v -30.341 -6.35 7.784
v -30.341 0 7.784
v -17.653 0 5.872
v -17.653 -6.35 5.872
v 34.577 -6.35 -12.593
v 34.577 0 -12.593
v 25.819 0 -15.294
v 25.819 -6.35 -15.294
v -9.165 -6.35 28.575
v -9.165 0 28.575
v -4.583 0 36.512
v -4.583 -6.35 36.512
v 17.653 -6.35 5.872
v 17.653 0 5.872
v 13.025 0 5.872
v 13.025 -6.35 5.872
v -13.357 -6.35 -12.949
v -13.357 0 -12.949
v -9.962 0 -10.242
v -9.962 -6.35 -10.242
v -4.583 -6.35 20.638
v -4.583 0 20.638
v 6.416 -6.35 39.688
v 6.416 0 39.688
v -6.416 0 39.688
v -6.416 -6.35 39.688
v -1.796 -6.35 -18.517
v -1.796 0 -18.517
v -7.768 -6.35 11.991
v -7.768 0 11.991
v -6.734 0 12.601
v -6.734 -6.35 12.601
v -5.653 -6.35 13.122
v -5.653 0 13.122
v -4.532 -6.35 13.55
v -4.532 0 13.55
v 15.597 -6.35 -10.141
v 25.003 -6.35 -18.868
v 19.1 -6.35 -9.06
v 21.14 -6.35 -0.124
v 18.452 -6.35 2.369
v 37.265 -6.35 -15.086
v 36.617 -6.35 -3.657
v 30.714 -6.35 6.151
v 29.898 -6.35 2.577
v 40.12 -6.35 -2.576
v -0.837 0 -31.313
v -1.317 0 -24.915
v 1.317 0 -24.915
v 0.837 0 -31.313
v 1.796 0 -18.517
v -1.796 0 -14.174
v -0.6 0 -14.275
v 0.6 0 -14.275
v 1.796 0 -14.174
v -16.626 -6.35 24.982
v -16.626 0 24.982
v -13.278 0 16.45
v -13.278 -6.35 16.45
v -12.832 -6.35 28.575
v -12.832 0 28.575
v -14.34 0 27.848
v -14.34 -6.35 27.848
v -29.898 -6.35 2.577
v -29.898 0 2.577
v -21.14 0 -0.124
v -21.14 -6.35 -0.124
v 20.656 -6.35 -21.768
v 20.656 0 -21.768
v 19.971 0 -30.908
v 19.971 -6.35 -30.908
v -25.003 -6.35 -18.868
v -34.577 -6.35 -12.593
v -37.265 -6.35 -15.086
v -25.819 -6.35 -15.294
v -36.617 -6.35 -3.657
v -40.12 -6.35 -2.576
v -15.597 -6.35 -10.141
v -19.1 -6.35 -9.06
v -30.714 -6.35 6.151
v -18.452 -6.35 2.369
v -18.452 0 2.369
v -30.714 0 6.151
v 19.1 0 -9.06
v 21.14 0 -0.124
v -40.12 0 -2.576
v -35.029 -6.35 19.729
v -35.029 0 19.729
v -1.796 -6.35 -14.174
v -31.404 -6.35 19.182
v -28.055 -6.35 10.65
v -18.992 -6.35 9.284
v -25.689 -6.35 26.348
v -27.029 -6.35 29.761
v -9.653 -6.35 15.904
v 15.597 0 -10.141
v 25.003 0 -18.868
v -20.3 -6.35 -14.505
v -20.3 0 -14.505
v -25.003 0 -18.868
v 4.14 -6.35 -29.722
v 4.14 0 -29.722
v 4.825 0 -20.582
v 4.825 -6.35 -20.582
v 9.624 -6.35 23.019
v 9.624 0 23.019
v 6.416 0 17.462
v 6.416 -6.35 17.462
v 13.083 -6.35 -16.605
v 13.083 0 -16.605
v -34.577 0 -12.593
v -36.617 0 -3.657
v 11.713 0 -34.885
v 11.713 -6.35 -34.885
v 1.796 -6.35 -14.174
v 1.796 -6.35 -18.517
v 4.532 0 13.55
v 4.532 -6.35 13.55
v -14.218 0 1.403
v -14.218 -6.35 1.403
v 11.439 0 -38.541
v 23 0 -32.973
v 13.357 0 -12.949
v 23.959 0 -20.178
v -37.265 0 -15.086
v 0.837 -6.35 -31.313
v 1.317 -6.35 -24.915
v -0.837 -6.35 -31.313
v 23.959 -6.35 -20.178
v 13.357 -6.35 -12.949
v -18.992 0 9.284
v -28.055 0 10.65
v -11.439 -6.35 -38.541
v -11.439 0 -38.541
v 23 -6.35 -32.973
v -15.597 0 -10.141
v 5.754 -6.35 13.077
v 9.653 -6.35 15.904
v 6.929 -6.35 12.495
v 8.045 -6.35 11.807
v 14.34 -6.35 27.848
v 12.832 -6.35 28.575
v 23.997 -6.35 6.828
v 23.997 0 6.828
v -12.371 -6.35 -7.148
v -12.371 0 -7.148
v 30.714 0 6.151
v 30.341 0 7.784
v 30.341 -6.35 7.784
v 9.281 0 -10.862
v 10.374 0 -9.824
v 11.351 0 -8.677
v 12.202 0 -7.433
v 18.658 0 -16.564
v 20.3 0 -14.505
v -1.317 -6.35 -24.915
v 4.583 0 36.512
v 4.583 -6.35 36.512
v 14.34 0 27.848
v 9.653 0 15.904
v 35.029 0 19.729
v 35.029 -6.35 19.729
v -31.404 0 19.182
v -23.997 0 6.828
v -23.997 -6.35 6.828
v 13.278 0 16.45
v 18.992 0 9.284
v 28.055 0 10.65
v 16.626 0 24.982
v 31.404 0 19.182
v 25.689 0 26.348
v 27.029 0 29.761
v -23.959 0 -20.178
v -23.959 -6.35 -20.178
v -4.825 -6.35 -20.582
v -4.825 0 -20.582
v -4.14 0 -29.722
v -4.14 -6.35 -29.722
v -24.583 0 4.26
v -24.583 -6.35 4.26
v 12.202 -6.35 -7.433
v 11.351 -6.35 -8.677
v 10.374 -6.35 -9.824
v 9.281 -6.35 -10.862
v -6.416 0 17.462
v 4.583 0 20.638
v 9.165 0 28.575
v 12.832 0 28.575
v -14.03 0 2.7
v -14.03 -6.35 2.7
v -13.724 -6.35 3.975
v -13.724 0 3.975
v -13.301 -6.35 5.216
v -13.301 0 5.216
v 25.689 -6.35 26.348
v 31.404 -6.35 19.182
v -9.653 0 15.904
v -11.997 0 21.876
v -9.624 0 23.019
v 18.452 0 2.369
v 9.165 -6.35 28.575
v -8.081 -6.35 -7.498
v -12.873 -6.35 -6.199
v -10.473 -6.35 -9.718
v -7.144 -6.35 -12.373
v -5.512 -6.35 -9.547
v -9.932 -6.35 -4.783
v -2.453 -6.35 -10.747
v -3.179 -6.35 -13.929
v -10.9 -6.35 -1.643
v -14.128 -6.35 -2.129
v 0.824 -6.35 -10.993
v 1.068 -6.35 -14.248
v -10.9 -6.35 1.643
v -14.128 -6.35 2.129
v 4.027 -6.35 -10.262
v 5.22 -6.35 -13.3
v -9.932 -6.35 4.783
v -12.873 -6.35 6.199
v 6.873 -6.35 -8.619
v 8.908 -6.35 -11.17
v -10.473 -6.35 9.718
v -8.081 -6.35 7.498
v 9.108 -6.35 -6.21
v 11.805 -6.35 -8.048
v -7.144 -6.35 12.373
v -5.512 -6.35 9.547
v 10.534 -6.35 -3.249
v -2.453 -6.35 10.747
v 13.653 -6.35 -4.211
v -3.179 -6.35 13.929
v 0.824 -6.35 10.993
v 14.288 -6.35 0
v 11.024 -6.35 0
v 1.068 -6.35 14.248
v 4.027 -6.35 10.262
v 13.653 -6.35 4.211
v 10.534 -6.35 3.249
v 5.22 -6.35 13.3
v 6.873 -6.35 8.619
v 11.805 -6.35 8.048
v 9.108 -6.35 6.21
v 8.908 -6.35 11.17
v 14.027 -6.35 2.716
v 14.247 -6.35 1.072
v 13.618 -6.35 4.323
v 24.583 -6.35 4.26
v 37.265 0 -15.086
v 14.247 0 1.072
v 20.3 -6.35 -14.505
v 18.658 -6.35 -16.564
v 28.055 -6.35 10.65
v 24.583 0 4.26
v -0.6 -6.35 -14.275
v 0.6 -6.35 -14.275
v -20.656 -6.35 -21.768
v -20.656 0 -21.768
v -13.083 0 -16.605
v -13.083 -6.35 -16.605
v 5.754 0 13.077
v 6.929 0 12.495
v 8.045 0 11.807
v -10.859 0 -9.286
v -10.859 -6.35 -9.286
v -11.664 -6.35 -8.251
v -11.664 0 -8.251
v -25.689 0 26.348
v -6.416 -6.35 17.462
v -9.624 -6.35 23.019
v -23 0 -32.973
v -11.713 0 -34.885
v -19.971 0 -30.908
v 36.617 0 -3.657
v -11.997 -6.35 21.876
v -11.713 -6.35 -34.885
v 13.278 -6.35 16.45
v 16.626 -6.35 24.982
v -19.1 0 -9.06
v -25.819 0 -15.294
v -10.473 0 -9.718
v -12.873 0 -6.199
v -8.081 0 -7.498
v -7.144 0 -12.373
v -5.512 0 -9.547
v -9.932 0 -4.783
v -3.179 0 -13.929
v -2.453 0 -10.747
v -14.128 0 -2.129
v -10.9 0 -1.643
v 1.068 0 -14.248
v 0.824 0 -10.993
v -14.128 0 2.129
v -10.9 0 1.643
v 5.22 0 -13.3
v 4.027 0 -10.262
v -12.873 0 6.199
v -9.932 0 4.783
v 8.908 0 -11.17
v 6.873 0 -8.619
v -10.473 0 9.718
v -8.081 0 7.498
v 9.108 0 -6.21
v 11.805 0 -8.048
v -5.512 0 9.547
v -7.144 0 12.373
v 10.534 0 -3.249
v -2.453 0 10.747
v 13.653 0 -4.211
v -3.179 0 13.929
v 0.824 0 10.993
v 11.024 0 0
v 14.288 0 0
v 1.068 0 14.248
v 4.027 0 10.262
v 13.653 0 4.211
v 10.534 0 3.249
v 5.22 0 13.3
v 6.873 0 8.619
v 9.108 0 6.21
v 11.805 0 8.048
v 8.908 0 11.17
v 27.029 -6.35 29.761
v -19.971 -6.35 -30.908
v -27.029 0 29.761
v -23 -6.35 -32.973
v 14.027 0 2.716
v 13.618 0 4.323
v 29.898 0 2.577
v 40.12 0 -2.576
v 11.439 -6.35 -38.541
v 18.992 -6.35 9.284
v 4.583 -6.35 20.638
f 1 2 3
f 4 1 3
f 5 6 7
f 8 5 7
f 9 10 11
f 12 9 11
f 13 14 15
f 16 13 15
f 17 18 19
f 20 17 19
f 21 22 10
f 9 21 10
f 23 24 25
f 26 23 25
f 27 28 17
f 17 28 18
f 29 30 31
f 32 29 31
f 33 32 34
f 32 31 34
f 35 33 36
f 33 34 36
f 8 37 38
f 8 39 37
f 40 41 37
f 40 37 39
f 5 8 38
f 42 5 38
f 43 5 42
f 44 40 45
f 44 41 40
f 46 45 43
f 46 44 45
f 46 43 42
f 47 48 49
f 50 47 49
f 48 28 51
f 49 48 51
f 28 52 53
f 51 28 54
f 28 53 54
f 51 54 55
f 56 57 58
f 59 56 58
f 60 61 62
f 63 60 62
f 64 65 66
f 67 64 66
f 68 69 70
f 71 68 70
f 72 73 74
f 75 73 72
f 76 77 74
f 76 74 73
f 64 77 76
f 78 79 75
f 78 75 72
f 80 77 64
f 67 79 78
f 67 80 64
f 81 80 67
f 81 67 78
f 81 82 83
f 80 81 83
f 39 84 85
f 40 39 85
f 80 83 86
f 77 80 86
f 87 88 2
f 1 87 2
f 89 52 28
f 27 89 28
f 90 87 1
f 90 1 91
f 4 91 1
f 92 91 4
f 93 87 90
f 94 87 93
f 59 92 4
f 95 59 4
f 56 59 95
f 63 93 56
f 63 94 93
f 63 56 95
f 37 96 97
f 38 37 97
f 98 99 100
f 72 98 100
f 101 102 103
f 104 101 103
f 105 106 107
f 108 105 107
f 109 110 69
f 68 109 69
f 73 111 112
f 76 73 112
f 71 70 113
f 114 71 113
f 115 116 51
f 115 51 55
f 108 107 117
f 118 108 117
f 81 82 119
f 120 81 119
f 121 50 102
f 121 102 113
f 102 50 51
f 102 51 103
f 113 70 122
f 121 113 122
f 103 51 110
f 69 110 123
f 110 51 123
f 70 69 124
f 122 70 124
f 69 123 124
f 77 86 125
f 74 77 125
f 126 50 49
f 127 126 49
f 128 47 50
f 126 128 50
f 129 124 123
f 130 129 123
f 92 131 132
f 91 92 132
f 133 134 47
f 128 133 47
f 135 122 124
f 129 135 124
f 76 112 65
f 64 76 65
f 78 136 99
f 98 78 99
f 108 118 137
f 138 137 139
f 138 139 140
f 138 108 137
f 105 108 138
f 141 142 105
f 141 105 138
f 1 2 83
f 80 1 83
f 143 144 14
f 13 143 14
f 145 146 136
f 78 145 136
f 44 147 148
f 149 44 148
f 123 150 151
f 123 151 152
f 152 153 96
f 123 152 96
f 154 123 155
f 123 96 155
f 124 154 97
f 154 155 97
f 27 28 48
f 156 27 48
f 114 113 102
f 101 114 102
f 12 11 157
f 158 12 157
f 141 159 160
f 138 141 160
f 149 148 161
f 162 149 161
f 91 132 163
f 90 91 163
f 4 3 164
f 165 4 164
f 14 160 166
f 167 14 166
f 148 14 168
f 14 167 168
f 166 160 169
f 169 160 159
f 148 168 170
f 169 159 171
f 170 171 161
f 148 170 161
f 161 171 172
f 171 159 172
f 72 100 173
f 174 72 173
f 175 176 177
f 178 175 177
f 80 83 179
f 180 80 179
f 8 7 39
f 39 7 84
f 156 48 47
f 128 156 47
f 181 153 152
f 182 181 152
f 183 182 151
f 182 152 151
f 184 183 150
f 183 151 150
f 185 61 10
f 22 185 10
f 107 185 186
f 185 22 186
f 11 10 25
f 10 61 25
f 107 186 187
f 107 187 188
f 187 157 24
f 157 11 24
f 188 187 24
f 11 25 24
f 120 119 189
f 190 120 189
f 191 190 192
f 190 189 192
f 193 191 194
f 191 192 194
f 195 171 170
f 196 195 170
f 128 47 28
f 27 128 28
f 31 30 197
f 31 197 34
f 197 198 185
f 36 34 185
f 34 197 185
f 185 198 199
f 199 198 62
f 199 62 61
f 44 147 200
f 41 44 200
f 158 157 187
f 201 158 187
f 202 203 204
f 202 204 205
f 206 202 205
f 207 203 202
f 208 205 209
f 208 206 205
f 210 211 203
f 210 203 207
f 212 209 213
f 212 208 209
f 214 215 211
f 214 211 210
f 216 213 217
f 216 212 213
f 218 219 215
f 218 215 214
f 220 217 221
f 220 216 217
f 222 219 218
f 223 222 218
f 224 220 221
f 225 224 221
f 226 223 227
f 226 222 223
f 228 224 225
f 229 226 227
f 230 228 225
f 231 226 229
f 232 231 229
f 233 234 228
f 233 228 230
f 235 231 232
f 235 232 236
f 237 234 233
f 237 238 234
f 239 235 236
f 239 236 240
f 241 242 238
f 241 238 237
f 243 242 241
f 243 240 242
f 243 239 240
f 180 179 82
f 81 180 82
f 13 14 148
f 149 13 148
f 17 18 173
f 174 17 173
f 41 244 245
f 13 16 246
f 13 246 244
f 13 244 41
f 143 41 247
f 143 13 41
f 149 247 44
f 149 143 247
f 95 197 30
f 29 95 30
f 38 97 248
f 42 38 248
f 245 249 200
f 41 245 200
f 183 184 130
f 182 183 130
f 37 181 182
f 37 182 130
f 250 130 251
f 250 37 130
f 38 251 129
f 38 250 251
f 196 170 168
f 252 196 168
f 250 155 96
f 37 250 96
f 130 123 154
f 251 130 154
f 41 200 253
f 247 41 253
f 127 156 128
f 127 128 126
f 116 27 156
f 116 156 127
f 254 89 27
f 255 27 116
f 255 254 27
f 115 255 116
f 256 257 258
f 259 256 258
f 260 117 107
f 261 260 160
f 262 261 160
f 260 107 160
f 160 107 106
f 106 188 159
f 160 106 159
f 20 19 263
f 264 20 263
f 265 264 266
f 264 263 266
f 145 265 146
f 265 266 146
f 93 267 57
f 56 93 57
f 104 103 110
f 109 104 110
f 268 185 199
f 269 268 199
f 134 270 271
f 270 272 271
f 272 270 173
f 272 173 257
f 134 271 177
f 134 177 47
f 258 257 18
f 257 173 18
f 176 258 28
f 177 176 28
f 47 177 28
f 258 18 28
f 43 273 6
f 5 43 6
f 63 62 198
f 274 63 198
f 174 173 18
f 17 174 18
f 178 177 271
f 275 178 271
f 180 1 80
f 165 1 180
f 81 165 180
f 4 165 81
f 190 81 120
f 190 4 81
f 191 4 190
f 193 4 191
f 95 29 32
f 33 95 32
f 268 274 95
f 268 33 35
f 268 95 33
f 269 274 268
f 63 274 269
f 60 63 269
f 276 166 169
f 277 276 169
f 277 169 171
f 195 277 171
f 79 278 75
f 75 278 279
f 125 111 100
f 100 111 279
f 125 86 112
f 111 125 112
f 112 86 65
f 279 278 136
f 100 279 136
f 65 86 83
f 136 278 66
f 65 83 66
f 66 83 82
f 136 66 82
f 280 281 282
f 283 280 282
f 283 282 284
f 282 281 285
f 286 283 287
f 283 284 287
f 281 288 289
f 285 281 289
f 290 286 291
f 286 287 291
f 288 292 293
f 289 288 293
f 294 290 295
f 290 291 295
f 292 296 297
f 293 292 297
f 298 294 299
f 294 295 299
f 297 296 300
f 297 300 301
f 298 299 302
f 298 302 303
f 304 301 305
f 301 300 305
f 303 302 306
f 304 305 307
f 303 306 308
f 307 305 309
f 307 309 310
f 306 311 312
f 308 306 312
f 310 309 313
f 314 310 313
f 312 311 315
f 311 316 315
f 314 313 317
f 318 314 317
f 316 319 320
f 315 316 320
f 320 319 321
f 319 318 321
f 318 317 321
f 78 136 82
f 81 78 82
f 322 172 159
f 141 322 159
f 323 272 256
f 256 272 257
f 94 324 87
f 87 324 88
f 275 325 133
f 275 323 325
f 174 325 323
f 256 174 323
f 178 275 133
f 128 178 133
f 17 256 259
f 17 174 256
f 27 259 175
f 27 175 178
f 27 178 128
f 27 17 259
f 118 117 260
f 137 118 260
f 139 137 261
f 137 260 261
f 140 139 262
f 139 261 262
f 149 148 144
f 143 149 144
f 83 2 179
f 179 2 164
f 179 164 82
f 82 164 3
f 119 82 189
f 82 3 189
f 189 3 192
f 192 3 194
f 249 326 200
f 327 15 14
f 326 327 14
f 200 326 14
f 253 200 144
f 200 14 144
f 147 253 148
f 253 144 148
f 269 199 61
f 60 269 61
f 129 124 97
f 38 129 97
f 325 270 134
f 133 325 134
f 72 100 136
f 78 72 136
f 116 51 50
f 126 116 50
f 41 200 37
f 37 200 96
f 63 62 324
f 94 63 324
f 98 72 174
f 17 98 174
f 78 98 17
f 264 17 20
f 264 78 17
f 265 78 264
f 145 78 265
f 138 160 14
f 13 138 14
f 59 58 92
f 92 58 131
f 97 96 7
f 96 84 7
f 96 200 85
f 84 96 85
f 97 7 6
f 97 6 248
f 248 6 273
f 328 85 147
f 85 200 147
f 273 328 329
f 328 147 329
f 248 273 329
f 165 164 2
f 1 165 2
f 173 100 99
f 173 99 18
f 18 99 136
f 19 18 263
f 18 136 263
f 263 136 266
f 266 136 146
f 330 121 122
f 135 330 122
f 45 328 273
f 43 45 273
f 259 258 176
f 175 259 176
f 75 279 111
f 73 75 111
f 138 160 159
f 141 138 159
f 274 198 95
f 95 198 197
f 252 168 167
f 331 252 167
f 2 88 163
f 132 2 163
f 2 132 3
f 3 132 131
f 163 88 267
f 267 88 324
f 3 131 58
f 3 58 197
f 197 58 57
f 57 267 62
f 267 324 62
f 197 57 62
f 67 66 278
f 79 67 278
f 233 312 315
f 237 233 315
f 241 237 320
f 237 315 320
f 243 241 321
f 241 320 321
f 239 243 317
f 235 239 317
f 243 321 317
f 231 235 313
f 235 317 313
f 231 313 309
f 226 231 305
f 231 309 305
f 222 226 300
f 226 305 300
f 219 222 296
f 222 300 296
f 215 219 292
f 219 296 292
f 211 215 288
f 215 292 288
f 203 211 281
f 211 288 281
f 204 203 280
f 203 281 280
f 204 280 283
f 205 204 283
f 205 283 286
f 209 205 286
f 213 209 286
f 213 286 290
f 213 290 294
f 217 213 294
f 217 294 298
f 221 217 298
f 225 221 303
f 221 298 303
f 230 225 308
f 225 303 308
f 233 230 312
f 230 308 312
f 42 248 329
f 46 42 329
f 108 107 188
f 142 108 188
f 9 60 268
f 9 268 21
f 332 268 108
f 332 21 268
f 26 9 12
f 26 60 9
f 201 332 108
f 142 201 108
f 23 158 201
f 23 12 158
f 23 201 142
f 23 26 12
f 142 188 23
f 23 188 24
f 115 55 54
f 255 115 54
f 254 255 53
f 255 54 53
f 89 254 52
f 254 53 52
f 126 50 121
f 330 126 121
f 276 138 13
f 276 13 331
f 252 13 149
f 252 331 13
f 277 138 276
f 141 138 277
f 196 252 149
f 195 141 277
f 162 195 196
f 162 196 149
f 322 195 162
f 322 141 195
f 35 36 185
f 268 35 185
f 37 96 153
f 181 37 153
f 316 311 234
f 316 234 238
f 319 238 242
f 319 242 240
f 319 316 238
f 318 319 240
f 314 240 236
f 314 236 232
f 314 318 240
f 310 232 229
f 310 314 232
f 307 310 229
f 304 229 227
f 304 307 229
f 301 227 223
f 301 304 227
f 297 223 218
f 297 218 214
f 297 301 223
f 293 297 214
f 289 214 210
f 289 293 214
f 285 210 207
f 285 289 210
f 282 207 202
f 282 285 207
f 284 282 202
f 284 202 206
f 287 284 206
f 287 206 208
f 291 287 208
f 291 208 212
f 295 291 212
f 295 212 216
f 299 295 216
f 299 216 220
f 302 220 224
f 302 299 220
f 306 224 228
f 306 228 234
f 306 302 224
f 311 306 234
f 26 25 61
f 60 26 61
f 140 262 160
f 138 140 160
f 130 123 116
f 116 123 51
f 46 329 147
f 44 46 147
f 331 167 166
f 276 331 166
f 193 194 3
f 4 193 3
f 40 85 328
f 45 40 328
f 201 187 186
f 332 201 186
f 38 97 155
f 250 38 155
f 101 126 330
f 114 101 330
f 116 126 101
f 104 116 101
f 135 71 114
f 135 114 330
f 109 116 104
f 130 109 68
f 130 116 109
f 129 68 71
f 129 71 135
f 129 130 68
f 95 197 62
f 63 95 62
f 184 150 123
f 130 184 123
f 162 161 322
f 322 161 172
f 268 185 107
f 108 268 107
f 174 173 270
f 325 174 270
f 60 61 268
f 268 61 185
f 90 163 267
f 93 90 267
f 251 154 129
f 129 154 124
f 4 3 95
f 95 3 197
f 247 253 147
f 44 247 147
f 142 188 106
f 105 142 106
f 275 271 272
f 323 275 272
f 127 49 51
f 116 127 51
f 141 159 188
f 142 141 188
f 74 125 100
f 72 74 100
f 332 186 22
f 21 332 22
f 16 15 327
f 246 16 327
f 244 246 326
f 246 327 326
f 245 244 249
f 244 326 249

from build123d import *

# Parameters (mm, degrees)
F0_R     = 14.2875
F0_R_2   = 11.0236
F2_DEPTH = 6.35


with BuildPart() as f2:
    # F0 (on Front) → F2 (new body)
    with BuildSketch(Plane.XZ):
        Circle(F0_R)
        Circle(F0_R_2, mode=Mode.SUBTRACT)
    extrude(amount=F2_DEPTH)


with BuildPart() as f2b:
    # F0 (on Front) → F2, piece 2 (new body)
    with BuildSketch(Plane.XZ):
        Polygon((-6.4158048664, 17.4625), (6.4158048664, 17.4625), (12.8316097327, 28.575), (6.4158048664, 39.6875), (-6.4158048664, 39.6875), (-12.8316097327, 28.575), align=None)
        Polygon((9.1654355234, 28.575), (4.5827177617, 20.6375), (-4.5827177617, 20.6375), (-9.1654355234, 28.575), (-4.5827177617, 36.5125), (4.5827177617, 36.5125), align=None, mode=Mode.SUBTRACT)
    extrude(amount=F2_DEPTH)


with BuildPart() as f2c:
    # F0 (on Front) → F2, piece 3 (new body)
    with BuildSketch(Plane.XZ):
        Polygon((-9.6525433577, 15.9037688949), (-14.3404568017, 27.8483775479), (-27.0287480556, 29.7608297412), (-35.0291258653, 19.7286732814), (-30.3412124213, 7.7840646283), (-17.6529211675, 5.8716124351), align=None)
        Polygon((-16.6262790331, 24.9820471308), (-13.2777694302, 16.4501838072), (-18.9923250086, 9.2843577645), (-28.0553901899, 10.6503950454), (-31.4038997928, 19.182258369), (-25.6893442144, 26.3480844117), align=None, mode=Mode.SUBTRACT)
    extrude(amount=F2_DEPTH)


with BuildPart() as f2d:
    # F0 (on Front) → F2, piece 4 (new body)
    with BuildSketch(Plane.XZ):
        Polygon((-18.4523295574, 2.3691754341), (-30.7138668725, 6.1513587989), (-40.1201024057, -2.5763523231), (-37.2648006238, -15.0862468097), (-25.0032633087, -18.8684301745), (-15.5970277755, -10.1407190525), align=None)
        Polygon((-29.8980663634, 2.5771032312), (-21.139825424, -0.124456315), (-19.1003241513, -9.060095234), (-25.8190638178, -15.2941746069), (-34.5773047571, -12.5926150606), (-36.6168060299, -3.6569761416), align=None, mode=Mode.SUBTRACT)
    extrude(amount=F2_DEPTH)


with BuildPart() as f2e:
    # F0 (on Front) → F2, piece 5 (new body)
    with BuildSketch(Plane.XZ):
        Polygon((-13.3571352415, -12.9494554509), (-23.9591087396, -20.1777585906), (-23.0002013434, -32.97348854), (-11.4393204491, -38.5409153497), (-0.837346951, -31.31261221), (-1.7962543472, -18.5168822606), align=None)
        Polygon((-20.6559999126, -21.7684519648), (-13.0831616997, -16.6053782936), (-4.8253896324, -20.5821117291), (-4.1404557779, -29.7219188358), (-11.7132939909, -34.8849925071), (-19.9710660582, -30.9082590715), align=None, mode=Mode.SUBTRACT)
    extrude(amount=F2_DEPTH)


with BuildPart() as f2f:
    # F0 (on Front) → F2, piece 6 (new body)
    with BuildSketch(Plane.XZ):
        Polygon((1.7962543472, -18.5168822606), (0.837346951, -31.31261221), (11.4393204491, -38.5409153497), (23.0002013434, -32.97348854), (23.9591087396, -20.1777585906), (13.3571352415, -12.9494554509), align=None)
        Polygon((4.1404557779, -29.7219188358), (4.8253896324, -20.5821117291), (13.0831616997, -16.6053782936), (20.6559999126, -21.7684519648), (19.9710660582, -30.9082590715), (11.7132939909, -34.8849925071), align=None, mode=Mode.SUBTRACT)
    extrude(amount=F2_DEPTH)


with BuildPart() as f2g:
    # F0 (on Front) → F2, piece 7 (new body)
    with BuildSketch(Plane.XZ):
        Polygon((15.5970277755, -10.1407190525), (25.0032633087, -18.8684301745), (37.2648006238, -15.0862468097), (40.1201024057, -2.5763523231), (30.7138668725, 6.1513587989), (18.4523295574, 2.3691754341), align=None)
        Polygon((25.8190638178, -15.2941746069), (19.1003241513, -9.060095234), (21.139825424, -0.124456315), (29.8980663634, 2.5771032312), (36.6168060299, -3.6569761416), (34.5773047571, -12.5926150606), align=None, mode=Mode.SUBTRACT)
    extrude(amount=F2_DEPTH)


with BuildPart() as f2h:
    # F0 (on Front) → F2, piece 8 (new body)
    with BuildSketch(Plane.XZ):
        Polygon((17.6529211675, 5.8716124351), (30.3412124213, 7.7840646283), (35.0291258653, 19.7286732814), (27.0287480556, 29.7608297412), (14.3404568017, 27.8483775479), (9.6525433577, 15.9037688949), align=None)
        Polygon((28.0553901899, 10.6503950454), (18.9923250086, 9.2843577645), (13.2777694302, 16.4501838072), (16.6262790331, 24.9820471308), (25.6893442144, 26.3480844117), (31.4038997928, 19.182258369), align=None, mode=Mode.SUBTRACT)
    extrude(amount=F2_DEPTH)


with BuildPart() as f2i:
    # F1 (on Front) → F2, piece 9 (new body)
    with BuildSketch(Plane.XZ):
        Polygon((-18.4523295574, 2.3691754341), (-17.6529211675, 5.8716124351), (-23.9970658214, 6.827838385), (-30.3412124213, 7.7840646283), (-30.7138668725, 6.1513587989), (-24.583098291, 4.26026714), align=None)
        with BuildLine():
            ThreePointArc((-14.2184648482, 1.4028234428), (-13.8914038987, 3.3408911946), (-13.3014573203, 5.2157347907))
            Line((-13.3014573203, 5.2157347907), (-17.6529211675, 5.8716124351))
            Line((-17.6529211675, 5.8716124351), (-18.4523295574, 2.3691754341))
            Line((-18.4523295574, 2.3691754341), (-14.2184648482, 1.4028234428))
        make_face()
    extrude(amount=F2_DEPTH)


with BuildPart() as f2j:
    # F1 (on Front) → F2, piece 10 (new body)
    with BuildSketch(Plane.XZ):
        Polygon((-6.4158048664, 17.4625), (-9.6237072576, 23.0187499274), (-12.8316097327, 28.575), (-14.3404568017, 27.8483775479), (-11.9965000414, 21.8760731238), (-9.6525433577, 15.9037688949), align=None)
        with BuildLine():
            ThreePointArc((-7.768296299, 11.991089561), (-6.1991139226, 12.8725927002), (-4.5315578077, 13.5498206662))
            Line((-4.5315578077, 13.5498206662), (-6.4158048664, 17.4625))
            Line((-6.4158048664, 17.4625), (-9.6525433577, 15.9037688949))
            Line((-9.6525433577, 15.9037688949), (-7.768296299, 11.991089561))
        make_face()
    extrude(amount=F2_DEPTH)


with BuildPart() as f2k:
    # F1 (on Front) → F2, piece 11 (new body)
    with BuildSketch(Plane.XZ):
        Polygon((9.6525433577, 15.9037688949), (11.9965000952, 21.8760732609), (14.3404568017, 27.8483775479), (12.8316097327, 28.575), (9.623707221, 23.018749864), (6.4158048664, 17.4625), align=None)
        with BuildLine():
            Line((8.0448181359, 11.8073518373), (9.6525433577, 15.9037688949))
            Line((9.6525433577, 15.9037688949), (6.4158048664, 17.4625))
            Line((6.4158048664, 17.4625), (4.5315578077, 13.5498206662))
            ThreePointArc((4.5315578077, 13.5498206662), (6.3482562467, 12.7996991713), (8.0448181359, 11.8073518373))
        make_face()
    extrude(amount=F2_DEPTH)


with BuildPart() as f2l:
    # F1 (on Front) → F2, piece 12 (new body)
    with BuildSketch(Plane.XZ):
        Polygon((17.6529211675, 5.8716124351), (18.4523295574, 2.3691754341), (24.583098204, 4.2602671131), (30.7138668725, 6.1513587989), (30.3412124213, 7.7840646283), (23.9970657427, 6.8278383732), align=None)
        with BuildLine():
            Line((14.2472214565, 1.0720713682), (18.4523295574, 2.3691754341))
            Line((18.4523295574, 2.3691754341), (17.6529211675, 5.8716124351))
            Line((17.6529211675, 5.8716124351), (13.0252379503, 5.8716124351))
            ThreePointArc((13.0252379503, 5.8716124351), (13.8457812758, 3.5251946205), (14.2472214565, 1.0720713682))
        make_face()
    extrude(amount=F2_DEPTH)


with BuildPart() as f2m:
    # F1 (on Front) → F2, piece 13 (new body)
    with BuildSketch(Plane.XZ):
        Polygon((25.0032633087, -18.8684301745), (20.3001454143, -14.5045744949), (15.5970277755, -10.1407190525), (13.3571352415, -12.9494554509), (18.6581221223, -16.5636071106), (23.9591087396, -20.1777585906), align=None)
        with BuildLine():
            Line((13.3571352415, -12.9494554509), (15.5970277755, -10.1407190525))
            Line((15.5970277755, -10.1407190525), (12.2017318969, -7.4330609419))
            ThreePointArc((12.2017318969, -7.4330609419), (10.8775349791, -9.2634706794), (9.2813687339, -10.8622672898))
            Line((9.2813687339, -10.8622672898), (13.3571352415, -12.9494554509))
        make_face()
    extrude(amount=F2_DEPTH)


with BuildPart() as f2n:
    # F1 (on Front) → F2, piece 14 (new body)
    with BuildSketch(Plane.XZ):
        Polygon((0.837346951, -31.31261221), (1.3168006488, -24.9147472398), (1.7962543472, -18.5168822606), (-1.7962543472, -18.5168822606), (-1.3168006489, -24.9147472385), (-0.837346951, -31.31261221), align=None)
        with BuildLine():
            Line((-1.7962543472, -18.5168822606), (1.7962543472, -18.5168822606))
            Line((1.7962543472, -18.5168822606), (1.7962543472, -14.1741358315))
            ThreePointArc((1.7962543472, -14.1741358315), (0, -14.2875), (-1.7962543472, -14.1741358315))
            Line((-1.7962543472, -14.1741358315), (-1.7962543472, -18.5168822606))
        make_face()
    extrude(amount=F2_DEPTH)


with BuildPart() as f2o:
    # F1 (on Front) → F2, piece 15 (new body)
    with BuildSketch(Plane.XZ):
        Polygon((-23.9591087396, -20.1777585906), (-18.6581221549, -16.5636071328), (-13.3571352415, -12.9494554509), (-15.5970277755, -10.1407190525), (-20.3001455485, -14.5045746194), (-25.0032633087, -18.8684301745), align=None)
        with BuildLine():
            Line((-13.3571352415, -12.9494554509), (-9.9618393628, -10.2417973403))
            ThreePointArc((-9.9618393628, -10.2417973403), (-11.2731625797, -8.7777253147), (-12.3711486526, -7.1475406445))
            Line((-12.3711486526, -7.1475406445), (-15.5970277755, -10.1407190525))
            Line((-15.5970277755, -10.1407190525), (-13.3571352415, -12.9494554509))
        make_face()
    extrude(amount=F2_DEPTH)


solid = Compound([f2.part, f2b.part, f2c.part, f2d.part, f2e.part, f2f.part, f2g.part, f2h.part, f2i.part, f2j.part, f2k.part, f2l.part, f2m.part, f2n.part, f2o.part])
